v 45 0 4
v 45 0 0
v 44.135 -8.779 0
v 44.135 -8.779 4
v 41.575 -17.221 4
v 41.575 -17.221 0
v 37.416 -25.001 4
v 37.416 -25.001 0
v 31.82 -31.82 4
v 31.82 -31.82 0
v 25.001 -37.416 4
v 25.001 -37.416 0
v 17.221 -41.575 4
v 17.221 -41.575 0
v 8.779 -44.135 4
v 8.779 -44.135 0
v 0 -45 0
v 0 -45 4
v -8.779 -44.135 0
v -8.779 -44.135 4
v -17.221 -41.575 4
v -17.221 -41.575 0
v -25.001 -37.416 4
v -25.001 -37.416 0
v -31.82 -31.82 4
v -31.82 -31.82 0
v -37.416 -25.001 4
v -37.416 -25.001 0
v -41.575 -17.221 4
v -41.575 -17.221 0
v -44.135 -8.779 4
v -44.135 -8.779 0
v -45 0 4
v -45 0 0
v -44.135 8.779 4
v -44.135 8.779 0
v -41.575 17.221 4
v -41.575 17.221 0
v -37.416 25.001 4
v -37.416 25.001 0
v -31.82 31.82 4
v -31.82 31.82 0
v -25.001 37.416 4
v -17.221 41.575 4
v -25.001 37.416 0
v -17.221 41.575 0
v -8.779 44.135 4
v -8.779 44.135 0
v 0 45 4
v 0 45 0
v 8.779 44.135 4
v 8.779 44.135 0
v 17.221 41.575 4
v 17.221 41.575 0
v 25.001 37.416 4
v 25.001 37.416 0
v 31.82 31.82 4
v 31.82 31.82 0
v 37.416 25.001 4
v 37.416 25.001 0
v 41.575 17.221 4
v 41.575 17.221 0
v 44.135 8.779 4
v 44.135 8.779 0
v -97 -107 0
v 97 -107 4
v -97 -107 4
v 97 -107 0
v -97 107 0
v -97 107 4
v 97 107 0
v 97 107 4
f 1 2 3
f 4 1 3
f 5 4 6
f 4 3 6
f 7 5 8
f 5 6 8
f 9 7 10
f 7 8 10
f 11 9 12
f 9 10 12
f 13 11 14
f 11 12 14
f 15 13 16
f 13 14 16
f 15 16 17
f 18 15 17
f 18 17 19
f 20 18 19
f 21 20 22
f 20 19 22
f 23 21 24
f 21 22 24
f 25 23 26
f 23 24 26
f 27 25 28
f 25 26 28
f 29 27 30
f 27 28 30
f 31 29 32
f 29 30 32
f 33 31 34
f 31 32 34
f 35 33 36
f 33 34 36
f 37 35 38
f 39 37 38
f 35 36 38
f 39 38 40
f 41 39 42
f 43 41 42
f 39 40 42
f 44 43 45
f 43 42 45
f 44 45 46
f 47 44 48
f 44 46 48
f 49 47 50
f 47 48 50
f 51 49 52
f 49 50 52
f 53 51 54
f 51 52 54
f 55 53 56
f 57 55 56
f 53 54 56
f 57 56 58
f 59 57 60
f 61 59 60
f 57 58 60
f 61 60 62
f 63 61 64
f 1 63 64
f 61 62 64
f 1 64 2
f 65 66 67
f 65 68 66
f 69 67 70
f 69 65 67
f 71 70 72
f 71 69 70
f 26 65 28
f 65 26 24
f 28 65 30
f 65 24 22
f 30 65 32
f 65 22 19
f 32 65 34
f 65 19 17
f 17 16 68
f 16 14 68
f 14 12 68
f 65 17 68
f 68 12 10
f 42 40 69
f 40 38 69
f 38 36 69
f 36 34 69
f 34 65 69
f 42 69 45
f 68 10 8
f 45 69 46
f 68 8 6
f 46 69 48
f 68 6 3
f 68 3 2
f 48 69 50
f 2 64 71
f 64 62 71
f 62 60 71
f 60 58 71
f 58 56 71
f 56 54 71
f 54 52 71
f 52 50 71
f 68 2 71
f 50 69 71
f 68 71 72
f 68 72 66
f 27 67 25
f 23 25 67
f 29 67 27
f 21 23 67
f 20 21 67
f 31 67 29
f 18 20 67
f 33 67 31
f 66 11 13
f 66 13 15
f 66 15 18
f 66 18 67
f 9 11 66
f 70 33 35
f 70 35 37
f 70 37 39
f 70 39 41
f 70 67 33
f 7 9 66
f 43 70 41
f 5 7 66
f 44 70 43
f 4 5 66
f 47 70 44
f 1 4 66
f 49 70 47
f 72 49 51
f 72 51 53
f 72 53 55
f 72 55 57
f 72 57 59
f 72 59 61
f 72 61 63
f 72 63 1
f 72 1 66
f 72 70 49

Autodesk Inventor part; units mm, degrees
ref_plane "YZ Plane" through (0, 0, 0) normal (1, 0, 0) x (0, 1, 0)
ref_plane "XZ Plane" through (0, 0, 0) normal (0, 1, 0) x (-1, 0, 0)
ref_plane "XY Plane" through (0, 0, 0) normal (0, 0, 1) x (1, 0, 0)
sketch "Sketch1" plane through (0, 0, 0) normal (0, 0, 1) x (1, 0, 0)
  line L0 (-97, 107) -> (97, 107)
  line L1 (97, 107) -> (97, -107)
  line L2 (97, -107) -> (-97, -107)
  line L3 (-97, -107) -> (-97, 107)
  line L4 (-97, 107) -> (97, -107) construction
  line L5 (97, 107) -> (-97, -107) construction
  point P0 (0, 0)
  dimension "d0" = 194
  dimension "d1" = 214
extrude "Plate1" add sketch "Sketch1" along normal blind 4
sketch "Sketch2" plane through (0, 0, 0) normal (0, 0, 1) x (1, 0, 0)
  circle A0 centre (0, 0) radius 45
  dimension "d3" = 90
extrude "Extrusion1" cut sketch "Sketch2" along normal blind 10
equation "\"d2\" = Thickness"
equation "\"BendRadius\" = Thickness"
equation "\"BendReliefWidth\" = Thickness"
equation "\"BendReliefDepth\" = 0.5 * Thickness"
equation "\"CornerReliefSize\" = 4 * Thickness"
equation "\"MinimumRemnant\" = 2 * Thickness"
equation "\"TransitionRadius\" = BendRadius"
equation "\"JacobiRadiusSize\" = BendRadius"
equation "\"GapSize\" = Thickness"
equation "\"Конус_Угол_продольный\" = 52.4deg"
equation "\"Конус_Угол_поперечный\" = 52deg"
equation "\"Thickness\" = 4"
properties part number "MSC 111 CONE IN BOTTOM" material "Stainless Steel"
